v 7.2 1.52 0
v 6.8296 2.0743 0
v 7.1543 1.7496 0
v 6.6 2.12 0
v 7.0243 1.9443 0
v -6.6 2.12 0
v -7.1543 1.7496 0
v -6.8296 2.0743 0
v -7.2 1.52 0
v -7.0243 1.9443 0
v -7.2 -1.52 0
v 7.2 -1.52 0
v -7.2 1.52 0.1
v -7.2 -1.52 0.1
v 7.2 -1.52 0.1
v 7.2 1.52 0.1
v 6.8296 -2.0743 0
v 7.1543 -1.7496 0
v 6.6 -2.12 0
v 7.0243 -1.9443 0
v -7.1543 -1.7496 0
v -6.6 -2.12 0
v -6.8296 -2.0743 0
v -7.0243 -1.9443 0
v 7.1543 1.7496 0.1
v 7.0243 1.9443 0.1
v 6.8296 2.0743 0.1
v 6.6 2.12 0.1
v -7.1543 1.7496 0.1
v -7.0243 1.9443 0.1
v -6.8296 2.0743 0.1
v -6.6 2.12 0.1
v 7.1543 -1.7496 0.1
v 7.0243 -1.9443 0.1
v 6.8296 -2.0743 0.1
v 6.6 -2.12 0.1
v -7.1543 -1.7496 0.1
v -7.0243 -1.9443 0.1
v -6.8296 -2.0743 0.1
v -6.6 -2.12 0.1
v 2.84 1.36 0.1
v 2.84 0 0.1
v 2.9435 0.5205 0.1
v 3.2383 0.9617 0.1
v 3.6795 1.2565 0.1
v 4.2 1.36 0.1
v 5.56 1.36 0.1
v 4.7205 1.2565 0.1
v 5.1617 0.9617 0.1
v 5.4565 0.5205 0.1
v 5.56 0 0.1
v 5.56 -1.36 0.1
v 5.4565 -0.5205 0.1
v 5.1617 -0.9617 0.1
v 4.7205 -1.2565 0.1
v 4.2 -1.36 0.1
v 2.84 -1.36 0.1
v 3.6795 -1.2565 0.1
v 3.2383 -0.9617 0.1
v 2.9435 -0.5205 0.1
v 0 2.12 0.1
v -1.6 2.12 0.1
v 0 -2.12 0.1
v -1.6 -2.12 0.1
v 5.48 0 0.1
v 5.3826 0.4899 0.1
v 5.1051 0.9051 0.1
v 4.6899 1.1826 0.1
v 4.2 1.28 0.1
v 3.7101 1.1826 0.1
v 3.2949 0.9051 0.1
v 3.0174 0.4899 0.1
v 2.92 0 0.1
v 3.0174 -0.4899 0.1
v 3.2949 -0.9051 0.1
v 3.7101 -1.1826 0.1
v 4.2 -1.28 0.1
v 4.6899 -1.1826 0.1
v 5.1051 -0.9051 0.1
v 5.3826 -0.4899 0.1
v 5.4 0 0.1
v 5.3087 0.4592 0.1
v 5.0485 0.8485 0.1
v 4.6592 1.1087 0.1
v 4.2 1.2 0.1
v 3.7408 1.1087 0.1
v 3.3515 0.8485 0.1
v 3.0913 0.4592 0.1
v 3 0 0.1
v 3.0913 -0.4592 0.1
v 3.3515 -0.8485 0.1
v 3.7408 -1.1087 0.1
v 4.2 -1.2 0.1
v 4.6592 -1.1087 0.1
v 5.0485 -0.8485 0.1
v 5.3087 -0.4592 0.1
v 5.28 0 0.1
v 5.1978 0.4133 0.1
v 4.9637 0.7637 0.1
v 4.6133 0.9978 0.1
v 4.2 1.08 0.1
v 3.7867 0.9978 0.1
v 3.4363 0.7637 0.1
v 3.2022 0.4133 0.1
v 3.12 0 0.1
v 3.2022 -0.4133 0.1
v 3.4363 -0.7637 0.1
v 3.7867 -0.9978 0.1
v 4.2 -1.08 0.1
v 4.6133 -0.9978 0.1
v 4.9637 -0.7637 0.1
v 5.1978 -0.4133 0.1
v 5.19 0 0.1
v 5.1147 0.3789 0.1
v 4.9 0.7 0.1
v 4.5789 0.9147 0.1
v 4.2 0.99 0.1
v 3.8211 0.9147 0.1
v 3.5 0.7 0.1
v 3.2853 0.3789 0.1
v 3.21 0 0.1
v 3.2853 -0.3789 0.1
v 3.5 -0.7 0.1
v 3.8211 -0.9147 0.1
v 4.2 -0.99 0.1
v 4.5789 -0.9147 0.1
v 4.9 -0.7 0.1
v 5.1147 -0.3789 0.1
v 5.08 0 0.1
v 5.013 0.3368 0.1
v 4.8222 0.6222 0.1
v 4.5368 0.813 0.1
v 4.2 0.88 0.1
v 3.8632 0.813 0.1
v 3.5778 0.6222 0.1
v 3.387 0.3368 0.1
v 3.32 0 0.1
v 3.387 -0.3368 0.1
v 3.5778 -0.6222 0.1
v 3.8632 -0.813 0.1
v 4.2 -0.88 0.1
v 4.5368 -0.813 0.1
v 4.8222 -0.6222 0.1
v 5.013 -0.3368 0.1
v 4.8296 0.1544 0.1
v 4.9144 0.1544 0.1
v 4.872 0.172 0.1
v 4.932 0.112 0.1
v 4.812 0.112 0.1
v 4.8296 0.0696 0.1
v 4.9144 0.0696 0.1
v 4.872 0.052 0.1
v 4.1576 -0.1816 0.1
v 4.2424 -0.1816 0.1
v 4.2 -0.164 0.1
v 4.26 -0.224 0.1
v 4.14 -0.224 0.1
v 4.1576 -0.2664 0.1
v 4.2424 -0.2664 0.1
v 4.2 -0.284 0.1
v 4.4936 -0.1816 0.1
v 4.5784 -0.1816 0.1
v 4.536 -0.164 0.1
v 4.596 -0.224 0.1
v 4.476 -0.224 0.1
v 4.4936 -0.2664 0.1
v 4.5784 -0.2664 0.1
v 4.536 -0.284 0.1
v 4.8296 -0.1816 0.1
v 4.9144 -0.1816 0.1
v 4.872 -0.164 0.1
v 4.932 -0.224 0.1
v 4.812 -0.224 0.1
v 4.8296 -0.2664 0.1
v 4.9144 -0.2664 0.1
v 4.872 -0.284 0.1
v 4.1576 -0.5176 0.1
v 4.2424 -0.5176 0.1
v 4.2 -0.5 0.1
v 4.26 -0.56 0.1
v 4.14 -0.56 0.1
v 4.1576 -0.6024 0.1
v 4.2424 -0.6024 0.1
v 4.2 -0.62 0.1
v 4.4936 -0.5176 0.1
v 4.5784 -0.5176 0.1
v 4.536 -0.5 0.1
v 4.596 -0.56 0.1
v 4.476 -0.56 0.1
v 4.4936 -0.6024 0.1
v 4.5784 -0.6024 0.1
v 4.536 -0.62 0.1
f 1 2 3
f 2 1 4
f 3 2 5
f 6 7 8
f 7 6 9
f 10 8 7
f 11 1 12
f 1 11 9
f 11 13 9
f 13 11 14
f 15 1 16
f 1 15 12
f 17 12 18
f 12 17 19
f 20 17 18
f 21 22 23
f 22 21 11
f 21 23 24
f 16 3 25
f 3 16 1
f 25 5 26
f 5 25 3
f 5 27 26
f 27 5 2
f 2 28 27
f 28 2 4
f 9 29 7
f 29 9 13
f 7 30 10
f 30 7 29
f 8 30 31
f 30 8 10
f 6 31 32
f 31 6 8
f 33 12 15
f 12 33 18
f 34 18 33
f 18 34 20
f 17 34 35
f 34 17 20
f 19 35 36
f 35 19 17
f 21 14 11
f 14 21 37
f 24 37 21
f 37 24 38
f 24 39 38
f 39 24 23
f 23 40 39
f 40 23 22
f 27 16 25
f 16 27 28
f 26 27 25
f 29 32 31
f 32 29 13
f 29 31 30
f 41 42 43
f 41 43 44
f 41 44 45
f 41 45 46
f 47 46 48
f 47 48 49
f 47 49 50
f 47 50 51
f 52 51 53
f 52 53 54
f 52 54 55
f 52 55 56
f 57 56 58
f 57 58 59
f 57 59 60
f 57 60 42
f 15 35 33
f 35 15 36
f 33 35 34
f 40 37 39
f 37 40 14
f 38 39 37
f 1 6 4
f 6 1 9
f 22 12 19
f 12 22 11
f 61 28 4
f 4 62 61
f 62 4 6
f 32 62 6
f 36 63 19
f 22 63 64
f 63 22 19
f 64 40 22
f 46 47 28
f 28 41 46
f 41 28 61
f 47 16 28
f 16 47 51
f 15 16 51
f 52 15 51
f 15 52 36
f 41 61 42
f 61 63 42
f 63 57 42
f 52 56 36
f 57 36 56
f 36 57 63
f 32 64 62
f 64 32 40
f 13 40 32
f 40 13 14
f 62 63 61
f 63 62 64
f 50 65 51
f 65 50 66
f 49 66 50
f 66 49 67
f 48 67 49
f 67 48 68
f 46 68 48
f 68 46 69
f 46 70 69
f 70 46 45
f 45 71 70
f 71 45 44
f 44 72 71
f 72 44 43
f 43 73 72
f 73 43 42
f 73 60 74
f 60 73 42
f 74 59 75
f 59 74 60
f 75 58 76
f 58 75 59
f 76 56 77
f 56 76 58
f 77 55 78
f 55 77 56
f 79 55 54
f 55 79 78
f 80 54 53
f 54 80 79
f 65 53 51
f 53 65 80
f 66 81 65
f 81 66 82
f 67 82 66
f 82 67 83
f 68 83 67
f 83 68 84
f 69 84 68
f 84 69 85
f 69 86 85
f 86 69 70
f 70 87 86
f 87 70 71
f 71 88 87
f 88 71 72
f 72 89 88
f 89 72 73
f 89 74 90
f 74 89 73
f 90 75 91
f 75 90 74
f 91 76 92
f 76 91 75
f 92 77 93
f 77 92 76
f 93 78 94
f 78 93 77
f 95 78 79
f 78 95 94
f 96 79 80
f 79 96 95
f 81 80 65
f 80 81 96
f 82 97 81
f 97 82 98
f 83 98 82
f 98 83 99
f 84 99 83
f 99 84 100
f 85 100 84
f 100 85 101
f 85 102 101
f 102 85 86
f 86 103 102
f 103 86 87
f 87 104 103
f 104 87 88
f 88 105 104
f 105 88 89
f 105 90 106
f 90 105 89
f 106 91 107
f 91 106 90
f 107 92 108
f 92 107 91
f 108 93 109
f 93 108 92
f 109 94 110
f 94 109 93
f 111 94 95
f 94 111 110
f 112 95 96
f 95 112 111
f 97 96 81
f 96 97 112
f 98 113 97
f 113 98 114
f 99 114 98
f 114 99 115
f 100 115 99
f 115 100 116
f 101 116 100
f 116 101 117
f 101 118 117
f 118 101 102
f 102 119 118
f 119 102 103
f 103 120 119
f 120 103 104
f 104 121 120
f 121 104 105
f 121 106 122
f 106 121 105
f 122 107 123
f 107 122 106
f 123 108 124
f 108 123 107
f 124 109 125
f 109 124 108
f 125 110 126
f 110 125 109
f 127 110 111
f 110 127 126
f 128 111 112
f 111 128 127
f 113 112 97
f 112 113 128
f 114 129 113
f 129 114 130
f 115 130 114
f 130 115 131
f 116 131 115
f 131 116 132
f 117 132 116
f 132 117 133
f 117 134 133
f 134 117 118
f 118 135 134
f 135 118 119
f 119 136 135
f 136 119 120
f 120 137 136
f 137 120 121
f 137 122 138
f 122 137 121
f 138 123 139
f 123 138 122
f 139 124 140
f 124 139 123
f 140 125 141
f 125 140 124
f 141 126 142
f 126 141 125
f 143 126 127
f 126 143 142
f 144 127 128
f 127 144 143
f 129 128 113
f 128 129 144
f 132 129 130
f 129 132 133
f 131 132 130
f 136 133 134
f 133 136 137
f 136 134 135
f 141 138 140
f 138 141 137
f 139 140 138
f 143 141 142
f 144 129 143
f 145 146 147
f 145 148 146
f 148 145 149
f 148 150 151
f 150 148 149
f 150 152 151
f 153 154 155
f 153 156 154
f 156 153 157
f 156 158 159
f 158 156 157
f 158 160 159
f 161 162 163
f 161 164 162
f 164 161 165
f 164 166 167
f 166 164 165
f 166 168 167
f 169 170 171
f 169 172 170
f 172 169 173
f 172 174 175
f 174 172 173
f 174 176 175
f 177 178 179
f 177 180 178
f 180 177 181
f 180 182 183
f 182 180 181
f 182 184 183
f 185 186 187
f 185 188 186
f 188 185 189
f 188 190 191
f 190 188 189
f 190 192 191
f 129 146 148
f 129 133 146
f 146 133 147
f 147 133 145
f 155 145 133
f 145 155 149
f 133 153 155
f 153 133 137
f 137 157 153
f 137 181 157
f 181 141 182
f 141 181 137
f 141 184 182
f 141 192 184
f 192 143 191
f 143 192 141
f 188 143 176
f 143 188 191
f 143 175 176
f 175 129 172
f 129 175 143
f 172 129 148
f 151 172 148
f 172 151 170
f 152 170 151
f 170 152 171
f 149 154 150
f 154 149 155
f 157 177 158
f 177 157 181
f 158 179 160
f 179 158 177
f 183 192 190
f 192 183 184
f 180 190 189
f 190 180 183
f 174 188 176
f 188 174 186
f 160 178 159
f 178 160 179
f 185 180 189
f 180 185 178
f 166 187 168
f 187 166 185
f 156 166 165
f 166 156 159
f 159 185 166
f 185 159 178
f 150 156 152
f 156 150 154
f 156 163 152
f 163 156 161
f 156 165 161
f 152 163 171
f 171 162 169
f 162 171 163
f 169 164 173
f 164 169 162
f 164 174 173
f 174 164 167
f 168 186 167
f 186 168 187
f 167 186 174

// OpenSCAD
// file: ../p/4-4ring9.scad
use <../lib.scad>
function ldraw_lib__4_4ring9() = [
// 0 Ring  9 x 1.0
// 0 Name: 4-4ring9.dat
// 0 Author: John Riley [jriley]
// 0 !LDRAW_ORG Primitive UPDATE 2004-02
// 0 !LICENSE Licensed under CC BY 2.0 and CC BY 4.0 : see CAreadme.txt
// 
// 0 BFC CERTIFY CCW
  [0,"BFC","CERTIFY"],
  [0,"BFC","CCW"],
// 
// 0 !HISTORY 2004-04-22 [PTadmin] Official Update 2004-02
// 0 !HISTORY 2007-06-24 [PTadmin] Header formatted for Contributor Agreement
// 0 !HISTORY 2008-07-01 [PTadmin] Official Update 2008-01
// 
// 
// 4 16 9 0 0 10 0 0 9.239 0 3.827 8.3151 0 3.4443
  [4,16,9,0,0,10,0,0,9.239,0,3.827,8.3151,0,3.4443],
// 4 16 8.3151 0 3.4443 9.239 0 3.827 7.071 0 7.071 6.3639 0 6.3639
  [4,16,8.3151,0,3.4443,9.239,0,3.827,7.071,0,7.071,6.3639,0,6.3639],
// 4 16 6.3639 0 6.3639 7.071 0 7.071 3.827 0 9.239 3.4443 0 8.3151
  [4,16,6.3639,0,6.3639,7.071,0,7.071,3.827,0,9.239,3.4443,0,8.3151],
// 4 16 3.4443 0 8.3151 3.827 0 9.239 0 0 10 0 0 9
  [4,16,3.4443,0,8.3151,3.827,0,9.239,0,0,10,0,0,9],
// 4 16 0 0 9 0 0 10 -3.827 0 9.239 -3.4443 0 8.3151
  [4,16,0,0,9,0,0,10,-3.827,0,9.239,-3.4443,0,8.3151],
// 4 16 -3.4443 0 8.3151 -3.827 0 9.239 -7.071 0 7.071 -6.3639 0 6.3639
  [4,16,-3.4443,0,8.3151,-3.827,0,9.239,-7.071,0,7.071,-6.3639,0,6.3639],
// 4 16 -6.3639 0 6.3639 -7.071 0 7.071 -9.239 0 3.827 -8.3151 0 3.4443
  [4,16,-6.3639,0,6.3639,-7.071,0,7.071,-9.239,0,3.827,-8.3151,0,3.4443],
// 4 16 -8.3151 0 3.4443 -9.239 0 3.827 -10 0 0 -9 0 0
  [4,16,-8.3151,0,3.4443,-9.239,0,3.827,-10,0,0,-9,0,0],
// 4 16 -9 0 0 -10 0 0 -9.239 0 -3.827 -8.3151 0 -3.4443
  [4,16,-9,0,0,-10,0,0,-9.239,0,-3.827,-8.3151,0,-3.4443],
// 4 16 -8.3151 0 -3.4443 -9.239 0 -3.827 -7.071 0 -7.071 -6.3639 0 -6.3639
  [4,16,-8.3151,0,-3.4443,-9.239,0,-3.827,-7.071,0,-7.071,-6.3639,0,-6.3639],
// 4 16 -6.3639 0 -6.3639 -7.071 0 -7.071 -3.827 0 -9.239 -3.4443 0 -8.3151
  [4,16,-6.3639,0,-6.3639,-7.071,0,-7.071,-3.827,0,-9.239,-3.4443,0,-8.3151],
// 4 16 -3.4443 0 -8.3151 -3.827 0 -9.239 0 0 -10 0 0 -9
  [4,16,-3.4443,0,-8.3151,-3.827,0,-9.239,0,0,-10,0,0,-9],
// 4 16 0 0 -9 0 0 -10 3.827 0 -9.239 3.4443 0 -8.3151
  [4,16,0,0,-9,0,0,-10,3.827,0,-9.239,3.4443,0,-8.3151],
// 4 16 3.4443 0 -8.3151 3.827 0 -9.239 7.071 0 -7.071 6.3639 0 -6.3639
  [4,16,3.4443,0,-8.3151,3.827,0,-9.239,7.071,0,-7.071,6.3639,0,-6.3639],
// 4 16 6.3639 0 -6.3639 7.071 0 -7.071 9.239 0 -3.827 8.3151 0 -3.4443
  [4,16,6.3639,0,-6.3639,7.071,0,-7.071,9.239,0,-3.827,8.3151,0,-3.4443],
// 4 16 8.3151 0 -3.4443 9.239 0 -3.827 10 0 0 9 0 0
  [4,16,8.3151,0,-3.4443,9.239,0,-3.827,10,0,0,9,0,0],
// 0
];
module ldraw_lib__4_4ring9(step=0, col=false, unit=2/5, alt=false, line=0.2, solid=!$preview)
    makepoly(ldraw_lib__4_4ring9(), step=step, col=col, unit=unit, alt=alt, line=line, solid=solid);
ldraw_lib__4_4ring9(line=0.2);
// file: ../p/4-4ring8.scad
use <../lib.scad>
function ldraw_lib__4_4ring8() = [
// 0 Ring  8 x 1.0
// 0 Name: 4-4ring8.dat
// 0 Author: Steffen [Steffen]
// 0 !LDRAW_ORG Primitive UPDATE 2012-01
// 0 !LICENSE Licensed under CC BY 4.0 : see CAreadme.txt
// 
// 0 BFC CERTIFY CCW
  [0,"BFC","CERTIFY"],
  [0,"BFC","CCW"],
// 
// 0 !HISTORY 2003-12-19 [PTadmin] Official Update 2003-03
// 0 !HISTORY 2007-06-24 [PTadmin] Header formatted for Contributor Agreement
// 0 !HISTORY 2008-07-01 [PTadmin] Official Update 2008-01
// 0 !HISTORY 2012-02-16 [Philo] Changed to CCW
// 0 !HISTORY 2012-03-30 [PTadmin] Official Update 2012-01
// 
// 
// 4 16 9 0 0 8.3151 0 3.4443 7.3912 0 3.0616 8 0 0
  [4,16,9,0,0,8.3151,0,3.4443,7.3912,0,3.0616,8,0,0],
// 4 16 8.3151 0 3.4443 6.3639 0 6.3639 5.6568 0 5.6568 7.3912 0 3.0616
  [4,16,8.3151,0,3.4443,6.3639,0,6.3639,5.6568,0,5.6568,7.3912,0,3.0616],
// 4 16 6.3639 0 6.3639 3.4443 0 8.3151 3.0616 0 7.3912 5.6568 0 5.6568
  [4,16,6.3639,0,6.3639,3.4443,0,8.3151,3.0616,0,7.3912,5.6568,0,5.6568],
// 4 16 3.4443 0 8.3151 0 0 9 0 0 8 3.0616 0 7.3912
  [4,16,3.4443,0,8.3151,0,0,9,0,0,8,3.0616,0,7.3912],
// 4 16 0 0 9 -3.4443 0 8.3151 -3.0616 0 7.3912 0 0 8
  [4,16,0,0,9,-3.4443,0,8.3151,-3.0616,0,7.3912,0,0,8],
// 4 16 -3.4443 0 8.3151 -6.3639 0 6.3639 -5.6568 0 5.6568 -3.0616 0 7.3912
  [4,16,-3.4443,0,8.3151,-6.3639,0,6.3639,-5.6568,0,5.6568,-3.0616,0,7.3912],
// 4 16 -6.3639 0 6.3639 -8.3151 0 3.4443 -7.3912 0 3.0616 -5.6568 0 5.6568
  [4,16,-6.3639,0,6.3639,-8.3151,0,3.4443,-7.3912,0,3.0616,-5.6568,0,5.6568],
// 4 16 -8.3151 0 3.4443 -9 0 0 -8 0 0 -7.3912 0 3.0616
  [4,16,-8.3151,0,3.4443,-9,0,0,-8,0,0,-7.3912,0,3.0616],
// 4 16 -9 0 0 -8.3151 0 -3.4443 -7.3912 0 -3.0616 -8 0 0
  [4,16,-9,0,0,-8.3151,0,-3.4443,-7.3912,0,-3.0616,-8,0,0],
// 4 16 -8.3151 0 -3.4443 -6.3639 0 -6.3639 -5.6568 0 -5.6568 -7.3912 0 -3.0616
  [4,16,-8.3151,0,-3.4443,-6.3639,0,-6.3639,-5.6568,0,-5.6568,-7.3912,0,-3.0616],
// 4 16 -6.3639 0 -6.3639 -3.4443 0 -8.3151 -3.0616 0 -7.3912 -5.6568 0 -5.6568
  [4,16,-6.3639,0,-6.3639,-3.4443,0,-8.3151,-3.0616,0,-7.3912,-5.6568,0,-5.6568],
// 4 16 -3.4443 0 -8.3151 0 0 -9 0 0 -8 -3.0616 0 -7.3912
  [4,16,-3.4443,0,-8.3151,0,0,-9,0,0,-8,-3.0616,0,-7.3912],
// 4 16 0 0 -9 3.4443 0 -8.3151 3.0616 0 -7.3912 0 0 -8
  [4,16,0,0,-9,3.4443,0,-8.3151,3.0616,0,-7.3912,0,0,-8],
// 4 16 3.4443 0 -8.3151 6.3639 0 -6.3639 5.6568 0 -5.6568 3.0616 0 -7.3912
  [4,16,3.4443,0,-8.3151,6.3639,0,-6.3639,5.6568,0,-5.6568,3.0616,0,-7.3912],
// 4 16 6.3639 0 -6.3639 8.3151 0 -3.4443 7.3912 0 -3.0616 5.6568 0 -5.6568
  [4,16,6.3639,0,-6.3639,8.3151,0,-3.4443,7.3912,0,-3.0616,5.6568,0,-5.6568],
// 4 16 8.3151 0 -3.4443 9 0 0 8 0 0 7.3912 0 -3.0616
  [4,16,8.3151,0,-3.4443,9,0,0,8,0,0,7.3912,0,-3.0616],
];
module ldraw_lib__4_4ring8(step=0, col=false, unit=2/5, alt=false, line=0.2, solid=!$preview)
    makepoly(ldraw_lib__4_4ring8(), step=step, col=col, unit=unit, alt=alt, line=line, solid=solid);
ldraw_lib__4_4ring8(line=0.2);
// file: ../p/4-4rin16.scad
use <../lib.scad>
function ldraw_lib__4_4rin16() = [
// 0 Ring 16 x 1.0
// 0 Name: 4-4rin16.dat
// 0 Author: Guy Vivan [guyvivan]
// 0 !LDRAW_ORG Primitive UPDATE 2009-01
// 0 !LICENSE Licensed under CC BY 2.0 and CC BY 4.0 : see CAreadme.txt
// 
// 0 BFC CERTIFY CCW
  [0,"BFC","CERTIFY"],
  [0,"BFC","CCW"],
// 
// 0 !HISTORY 2009-05-02 [PTadmin] Official Update 2009-01
// 
// 
// 4 16 16 0 0 17 0 0 15.7063 0 6.5059 14.7824 0 6.1232
  [4,16,16,0,0,17,0,0,15.7063,0,6.5059,14.7824,0,6.1232],
// 4 16 14.7824 0 6.1232 15.7063 0 6.5059 12.0207 0 12.0207 11.3136 0 11.3136
  [4,16,14.7824,0,6.1232,15.7063,0,6.5059,12.0207,0,12.0207,11.3136,0,11.3136],
// 4 16 11.3136 0 11.3136 12.0207 0 12.0207 6.5059 0 15.7063 6.1232 0 14.7824
  [4,16,11.3136,0,11.3136,12.0207,0,12.0207,6.5059,0,15.7063,6.1232,0,14.7824],
// 4 16 6.1232 0 14.7824 6.5059 0 15.7063 0 0 17 0 0 16
  [4,16,6.1232,0,14.7824,6.5059,0,15.7063,0,0,17,0,0,16],
// 4 16 0 0 16 0 0 17 -6.5059 0 15.7063 -6.1232 0 14.7824
  [4,16,0,0,16,0,0,17,-6.5059,0,15.7063,-6.1232,0,14.7824],
// 4 16 -6.1232 0 14.7824 -6.5059 0 15.7063 -12.0207 0 12.0207 -11.3136 0 11.3136
  [4,16,-6.1232,0,14.7824,-6.5059,0,15.7063,-12.0207,0,12.0207,-11.3136,0,11.3136],
// 4 16 -11.3136 0 11.3136 -12.0207 0 12.0207 -15.7063 0 6.5059 -14.7824 0 6.1232
  [4,16,-11.3136,0,11.3136,-12.0207,0,12.0207,-15.7063,0,6.5059,-14.7824,0,6.1232],
// 4 16 -14.7824 0 6.1232 -15.7063 0 6.5059 -17 0 0 -16 0 0
  [4,16,-14.7824,0,6.1232,-15.7063,0,6.5059,-17,0,0,-16,0,0],
// 4 16 -16 0 0 -17 0 0 -15.7063 0 -6.5059 -14.7824 0 -6.1232
  [4,16,-16,0,0,-17,0,0,-15.7063,0,-6.5059,-14.7824,0,-6.1232],
// 4 16 -14.7824 0 -6.1232 -15.7063 0 -6.5059 -12.0207 0 -12.0207 -11.3136 0 -11.3136
  [4,16,-14.7824,0,-6.1232,-15.7063,0,-6.5059,-12.0207,0,-12.0207,-11.3136,0,-11.3136],
// 4 16 -11.3136 0 -11.3136 -12.0207 0 -12.0207 -6.5059 0 -15.7063 -6.1232 0 -14.7824
  [4,16,-11.3136,0,-11.3136,-12.0207,0,-12.0207,-6.5059,0,-15.7063,-6.1232,0,-14.7824],
// 4 16 -6.1232 0 -14.7824 -6.5059 0 -15.7063 0 0 -17 0 0 -16
  [4,16,-6.1232,0,-14.7824,-6.5059,0,-15.7063,0,0,-17,0,0,-16],
// 4 16 0 0 -16 0 0 -17 6.5059 0 -15.7063 6.1232 0 -14.7824
  [4,16,0,0,-16,0,0,-17,6.5059,0,-15.7063,6.1232,0,-14.7824],
// 4 16 6.1232 0 -14.7824 6.5059 0 -15.7063 12.0207 0 -12.0207 11.3136 0 -11.3136
  [4,16,6.1232,0,-14.7824,6.5059,0,-15.7063,12.0207,0,-12.0207,11.3136,0,-11.3136],
// 4 16 11.3136 0 -11.3136 12.0207 0 -12.0207 15.7063 0 -6.5059 14.7824 0 -6.1232
  [4,16,11.3136,0,-11.3136,12.0207,0,-12.0207,15.7063,0,-6.5059,14.7824,0,-6.1232],
// 4 16 14.7824 0 -6.1232 15.7063 0 -6.5059 17 0 0 16 0 0
  [4,16,14.7824,0,-6.1232,15.7063,0,-6.5059,17,0,0,16,0,0],
// 
// 0 end of file
// 
];
module ldraw_lib__4_4rin16(step=0, col=false, unit=2/5, alt=false, line=0.2, solid=!$preview)
    makepoly(ldraw_lib__4_4rin16(), step=step, col=col, unit=unit, alt=alt, line=line, solid=solid);
ldraw_lib__4_4rin16(line=0.2);
// file: ../p/4-4rin15.scad
use <../lib.scad>
function ldraw_lib__4_4rin15() = [
// 0 Ring 15 x 1.0
// 0 Name: 4-4rin15.dat
// 0 Author: Mark Kennedy [mkennedy]
// 0 !LDRAW_ORG Primitive UPDATE 2012-01
// 0 !LICENSE Licensed under CC BY 4.0 : see CAreadme.txt
// 
// 0 BFC CERTIFY CCW
  [0,"BFC","CERTIFY"],
  [0,"BFC","CCW"],
// 
// 0 !HISTORY 2004-04-22 [PTadmin] Official Update 2004-02
// 0 !HISTORY 2007-06-24 [PTadmin] Header formatted for Contributor Agreement
// 0 !HISTORY 2008-07-01 [PTadmin] Official Update 2008-01
// 0 !HISTORY 2012-02-16 [Philo] Changed to CCW
// 0 !HISTORY 2012-03-30 [PTadmin] Official Update 2012-01
// 
// 
// 4 16 16 0 0 14.7824 0 6.1232 13.8585 0 5.7405 15 0 0
  [4,16,16,0,0,14.7824,0,6.1232,13.8585,0,5.7405,15,0,0],
// 4 16 14.7824 0 6.1232 11.3136 0 11.3136 10.6065 0 10.6065 13.8585 0 5.7405
  [4,16,14.7824,0,6.1232,11.3136,0,11.3136,10.6065,0,10.6065,13.8585,0,5.7405],
// 4 16 11.3136 0 11.3136 6.1232 0 14.7824 5.7405 0 13.8585 10.6065 0 10.6065
  [4,16,11.3136,0,11.3136,6.1232,0,14.7824,5.7405,0,13.8585,10.6065,0,10.6065],
// 4 16 6.1232 0 14.7824 0 0 16 0 0 15 5.7405 0 13.8585
  [4,16,6.1232,0,14.7824,0,0,16,0,0,15,5.7405,0,13.8585],
// 4 16 0 0 16 -6.1232 0 14.7824 -5.7405 0 13.8585 0 0 15
  [4,16,0,0,16,-6.1232,0,14.7824,-5.7405,0,13.8585,0,0,15],
// 4 16 -6.1232 0 14.7824 -11.3136 0 11.3136 -10.6065 0 10.6065 -5.7405 0 13.8585
  [4,16,-6.1232,0,14.7824,-11.3136,0,11.3136,-10.6065,0,10.6065,-5.7405,0,13.8585],
// 4 16 -11.3136 0 11.3136 -14.7824 0 6.1232 -13.8585 0 5.7405 -10.6065 0 10.6065
  [4,16,-11.3136,0,11.3136,-14.7824,0,6.1232,-13.8585,0,5.7405,-10.6065,0,10.6065],
// 4 16 -14.7824 0 6.1232 -16 0 0 -15 0 0 -13.8585 0 5.7405
  [4,16,-14.7824,0,6.1232,-16,0,0,-15,0,0,-13.8585,0,5.7405],
// 4 16 -16 0 0 -14.7824 0 -6.1232 -13.8585 0 -5.7405 -15 0 0
  [4,16,-16,0,0,-14.7824,0,-6.1232,-13.8585,0,-5.7405,-15,0,0],
// 4 16 -14.7824 0 -6.1232 -11.3136 0 -11.3136 -10.6065 0 -10.6065 -13.8585 0 -5.7405
  [4,16,-14.7824,0,-6.1232,-11.3136,0,-11.3136,-10.6065,0,-10.6065,-13.8585,0,-5.7405],
// 4 16 -11.3136 0 -11.3136 -6.1232 0 -14.7824 -5.7405 0 -13.8585 -10.6065 0 -10.6065
  [4,16,-11.3136,0,-11.3136,-6.1232,0,-14.7824,-5.7405,0,-13.8585,-10.6065,0,-10.6065],
// 4 16 -6.1232 0 -14.7824 0 0 -16 0 0 -15 -5.7405 0 -13.8585
  [4,16,-6.1232,0,-14.7824,0,0,-16,0,0,-15,-5.7405,0,-13.8585],
// 4 16 0 0 -16 6.1232 0 -14.7824 5.7405 0 -13.8585 0 0 -15
  [4,16,0,0,-16,6.1232,0,-14.7824,5.7405,0,-13.8585,0,0,-15],
// 4 16 6.1232 0 -14.7824 11.3136 0 -11.3136 10.6065 0 -10.6065 5.7405 0 -13.8585
  [4,16,6.1232,0,-14.7824,11.3136,0,-11.3136,10.6065,0,-10.6065,5.7405,0,-13.8585],
// 4 16 11.3136 0 -11.3136 14.7824 0 -6.1232 13.8585 0 -5.7405 10.6065 0 -10.6065
  [4,16,11.3136,0,-11.3136,14.7824,0,-6.1232,13.8585,0,-5.7405,10.6065,0,-10.6065],
// 4 16 14.7824 0 -6.1232 16 0 0 15 0 0 13.8585 0 -5.7405
  [4,16,14.7824,0,-6.1232,16,0,0,15,0,0,13.8585,0,-5.7405],
];
module ldraw_lib__4_4rin15(step=0, col=false, unit=2/5, alt=false, line=0.2, solid=!$preview)
    makepoly(ldraw_lib__4_4rin15(), step=step, col=col, unit=unit, alt=alt, line=line, solid=solid);
ldraw_lib__4_4rin15(line=0.2);
// file: ../p/4-4rin11.scad
use <../lib.scad>
function ldraw_lib__4_4rin11() = [
// 0 Ring 11 x 1.0
// 0 Name: 4-4rin11.dat
// 0 Author: John Riley [jriley]
// 0 !LDRAW_ORG Primitive UPDATE 2003-03
// 0 !LICENSE Licensed under CC BY 2.0 and CC BY 4.0 : see CAreadme.txt
// 
// 0 BFC CERTIFY CCW
  [0,"BFC","CERTIFY"],
  [0,"BFC","CCW"],
// 
// 0 !HISTORY 2003-12-19 [PTadmin] Official Update 2003-03
// 0 !HISTORY 2007-06-24 [PTadmin] Header formatted for Contributor Agreement
// 0 !HISTORY 2008-07-01 [PTadmin] Official Update 2008-01
// 
// 
// 4 16 11 0 0 12 0 0 11.0868 0 4.5924 10.1629 0 4.2097
  [4,16,11,0,0,12,0,0,11.0868,0,4.5924,10.1629,0,4.2097],
// 4 16 10.1629 0 4.2097 11.0868 0 4.5924 8.4852 0 8.4852 7.7781 0 7.7781
  [4,16,10.1629,0,4.2097,11.0868,0,4.5924,8.4852,0,8.4852,7.7781,0,7.7781],
// 4 16 7.7781 0 7.7781 8.4852 0 8.4852 4.5924 0 11.0868 4.2097 0 10.1629
  [4,16,7.7781,0,7.7781,8.4852,0,8.4852,4.5924,0,11.0868,4.2097,0,10.1629],
// 4 16 4.2097 0 10.1629 4.5924 0 11.0868 0 0 12 0 0 11
  [4,16,4.2097,0,10.1629,4.5924,0,11.0868,0,0,12,0,0,11],
// 4 16 0 0 11 0 0 12 -4.5924 0 11.0868 -4.2097 0 10.1629
  [4,16,0,0,11,0,0,12,-4.5924,0,11.0868,-4.2097,0,10.1629],
// 4 16 -4.2097 0 10.1629 -4.5924 0 11.0868 -8.4852 0 8.4852 -7.7781 0 7.7781
  [4,16,-4.2097,0,10.1629,-4.5924,0,11.0868,-8.4852,0,8.4852,-7.7781,0,7.7781],
// 4 16 -7.7781 0 7.7781 -8.4852 0 8.4852 -11.0868 0 4.5924 -10.1629 0 4.2097
  [4,16,-7.7781,0,7.7781,-8.4852,0,8.4852,-11.0868,0,4.5924,-10.1629,0,4.2097],
// 4 16 -10.1629 0 4.2097 -11.0868 0 4.5924 -12 0 0 -11 0 0
  [4,16,-10.1629,0,4.2097,-11.0868,0,4.5924,-12,0,0,-11,0,0],
// 4 16 -11 0 0 -12 0 0 -11.0868 0 -4.5924 -10.1629 0 -4.2097
  [4,16,-11,0,0,-12,0,0,-11.0868,0,-4.5924,-10.1629,0,-4.2097],
// 4 16 -10.1629 0 -4.2097 -11.0868 0 -4.5924 -8.4852 0 -8.4852 -7.7781 0 -7.7781
  [4,16,-10.1629,0,-4.2097,-11.0868,0,-4.5924,-8.4852,0,-8.4852,-7.7781,0,-7.7781],
// 4 16 -7.7781 0 -7.7781 -8.4852 0 -8.4852 -4.5924 0 -11.0868 -4.2097 0 -10.1629
  [4,16,-7.7781,0,-7.7781,-8.4852,0,-8.4852,-4.5924,0,-11.0868,-4.2097,0,-10.1629],
// 4 16 -4.2097 0 -10.1629 -4.5924 0 -11.0868 0 0 -12 0 0 -11
  [4,16,-4.2097,0,-10.1629,-4.5924,0,-11.0868,0,0,-12,0,0,-11],
// 4 16 0 0 -11 0 0 -12 4.5924 0 -11.0868 4.2097 0 -10.1629
  [4,16,0,0,-11,0,0,-12,4.5924,0,-11.0868,4.2097,0,-10.1629],
// 4 16 4.2097 0 -10.1629 4.5924 0 -11.0868 8.4852 0 -8.4852 7.7781 0 -7.7781
  [4,16,4.2097,0,-10.1629,4.5924,0,-11.0868,8.4852,0,-8.4852,7.7781,0,-7.7781],
// 4 16 7.7781 0 -7.7781 8.4852 0 -8.4852 11.0868 0 -4.5924 10.1629 0 -4.2097
  [4,16,7.7781,0,-7.7781,8.4852,0,-8.4852,11.0868,0,-4.5924,10.1629,0,-4.2097],
// 4 16 10.1629 0 -4.2097 11.0868 0 -4.5924 12 0 0 11 0 0
  [4,16,10.1629,0,-4.2097,11.0868,0,-4.5924,12,0,0,11,0,0],
// 0
];
module ldraw_lib__4_4rin11(step=0, col=false, unit=2/5, alt=false, line=0.2, solid=!$preview)
    makepoly(ldraw_lib__4_4rin11(), step=step, col=col, unit=unit, alt=alt, line=line, solid=solid);
ldraw_lib__4_4rin11(line=0.2);
// file: ../p/1-8chrd.scad
use <../lib.scad>
function ldraw_lib__1_8chrd() = [
// 0 Chord 0.125
// 0 Name: 1-8chrd.dat
// 0 Author: Andy Westrate [westrate]
// 0 !LDRAW_ORG Primitive UPDATE 2004-02
// 0 !LICENSE Licensed under CC BY 2.0 and CC BY 4.0 : see CAreadme.txt
// 
// 0 BFC CERTIFY CCW
  [0,"BFC","CERTIFY"],
  [0,"BFC","CCW"],
// 
// 0 !HISTORY 2004-04-22 [PTadmin] Official Update 2004-02
// 0 !HISTORY 2007-06-22 [PTadmin] Header formatted for Contributor Agreement
// 0 !HISTORY 2008-07-01 [PTadmin] Official Update 2008-01
// 
// 
// 3 16 0.7071 0 0.7071 1 0 0 0.9239 0 0.3827
  [3,16,0.7071,0,0.7071,1,0,0,0.9239,0,0.3827],
// 
// 0
];
module ldraw_lib__1_8chrd(step=0, col=false, unit=2/5, alt=false, line=0.2, solid=!$preview)
    makepoly(ldraw_lib__1_8chrd(), step=step, col=col, unit=unit, alt=alt, line=line, solid=solid);
ldraw_lib__1_8chrd(line=0.2);
// file: ../p/box3u12.scad
use <../lib.scad>
function ldraw_lib__box3u12() = [
// 0 Box with 3 Parallel Faces without Any Edges
// 0 Name: box3u12.dat
// 0 Author: J.C. Tchang [tchang]
// 0 !LDRAW_ORG Primitive UPDATE 2014-02
// 0 !LICENSE Licensed under CC BY 4.0 : see CAreadme.txt
// 
// 0 BFC CERTIFY CCW
  [0,"BFC","CERTIFY"],
  [0,"BFC","CCW"],
// 
// 0 !HISTORY 2014-12-23 [PTadmin] Official Update 2014-02
// 
// 
// 4 16 -1 1 1 1 1 1 1 1 -1 -1 1 -1
  [4,16,-1,1,1,1,1,1,1,1,-1,-1,1,-1],
// 4 16 -1 1 1 -1 0 1 1 0 1 1 1 1
  [4,16,-1,1,1,-1,0,1,1,0,1,1,1,1],
// 4 16 1 1 -1 1 0 -1 -1 0 -1 -1 1 -1
  [4,16,1,1,-1,1,0,-1,-1,0,-1,-1,1,-1],
];
module ldraw_lib__box3u12(step=0, col=false, unit=2/5, alt=false, line=0.2, solid=!$preview)
    makepoly(ldraw_lib__box3u12(), step=step, col=col, unit=unit, alt=alt, line=line, solid=solid);
ldraw_lib__box3u12(line=0.2);
// file: ../p/4-4ndis.scad
use <../lib.scad>
function ldraw_lib__4_4ndis() = [
// 0 Disc Negative 1.0
// 0 Name: 4-4ndis.dat
// 0 Author: James Jessiman
// 0 !LDRAW_ORG Primitive UPDATE 2012-01
// 0 !LICENSE Licensed under CC BY 4.0 : see CAreadme.txt
// 
// 0 BFC CERTIFY CCW
  [0,"BFC","CERTIFY"],
  [0,"BFC","CCW"],
// 
// 0 !HISTORY 2002-03-23 [sbliss] Added BFC statement; compacted code
// 0 !HISTORY 2002-04-25 [PTadmin] Official Update 2002-02
// 0 !HISTORY 2007-06-24 [PTadmin] Header formatted for Contributor Agreement
// 0 !HISTORY 2008-07-01 [PTadmin] Official Update 2008-01
// 0 !HISTORY 2012-02-16 [Philo] Changed to CCW
// 0 !HISTORY 2012-03-30 [PTadmin] Official Update 2012-01
// 
// 
// 3 16 0.9239 0 0.3827 1 0 0 1 0 1
  [3,16,0.9239,0,0.3827,1,0,0,1,0,1],
// 3 16 0.7071 0 0.7071 0.9239 0 0.3827 1 0 1
  [3,16,0.7071,0,0.7071,0.9239,0,0.3827,1,0,1],
// 3 16 0.3827 0 0.9239 0.7071 0 0.7071 1 0 1
  [3,16,0.3827,0,0.9239,0.7071,0,0.7071,1,0,1],
// 3 16 0 0 1 0.3827 0 0.9239 1 0 1
  [3,16,0,0,1,0.3827,0,0.9239,1,0,1],
// 3 16 -0.3827 0 0.9239 0 0 1 -1 0 1
  [3,16,-0.3827,0,0.9239,0,0,1,-1,0,1],
// 3 16 -0.7071 0 0.7071 -0.3827 0 0.9239 -1 0 1
  [3,16,-0.7071,0,0.7071,-0.3827,0,0.9239,-1,0,1],
// 3 16 -0.9239 0 0.3827 -0.7071 0 0.7071 -1 0 1
  [3,16,-0.9239,0,0.3827,-0.7071,0,0.7071,-1,0,1],
// 3 16 -1 0 0 -0.9239 0 0.3827 -1 0 1
  [3,16,-1,0,0,-0.9239,0,0.3827,-1,0,1],
// 3 16 -0.9239 0 -0.3827 -1 0 0 -1 0 -1
  [3,16,-0.9239,0,-0.3827,-1,0,0,-1,0,-1],
// 3 16 -0.7071 0 -0.7071 -0.9239 0 -0.3827 -1 0 -1
  [3,16,-0.7071,0,-0.7071,-0.9239,0,-0.3827,-1,0,-1],
// 3 16 -0.3827 0 -0.9239 -0.7071 0 -0.7071 -1 0 -1
  [3,16,-0.3827,0,-0.9239,-0.7071,0,-0.7071,-1,0,-1],
// 3 16 0 0 -1 -0.3827 0 -0.9239 -1 0 -1
  [3,16,0,0,-1,-0.3827,0,-0.9239,-1,0,-1],
// 3 16 0.3827 0 -0.9239 0 0 -1 1 0 -1
  [3,16,0.3827,0,-0.9239,0,0,-1,1,0,-1],
// 3 16 0.7071 0 -0.7071 0.3827 0 -0.9239 1 0 -1
  [3,16,0.7071,0,-0.7071,0.3827,0,-0.9239,1,0,-1],
// 3 16 0.9239 0 -0.3827 0.7071 0 -0.7071 1 0 -1
  [3,16,0.9239,0,-0.3827,0.7071,0,-0.7071,1,0,-1],
// 3 16 1 0 0 0.9239 0 -0.3827 1 0 -1
  [3,16,1,0,0,0.9239,0,-0.3827,1,0,-1],
];
module ldraw_lib__4_4ndis(step=0, col=false, unit=2/5, alt=false, line=0.2, solid=!$preview)
    makepoly(ldraw_lib__4_4ndis(), step=step, col=col, unit=unit, alt=alt, line=line, solid=solid);
ldraw_lib__4_4ndis(line=0.2);
// file: ../p/1-4cyli.scad
use <../lib.scad>
function ldraw_lib__1_4cyli() = [
// 0 Cylinder 0.25
// 0 Name: 1-4cyli.dat
// 0 Author: James Jessiman
// 0 !LDRAW_ORG Primitive UPDATE 2012-01
// 0 !LICENSE Licensed under CC BY 4.0 : see CAreadme.txt
// 
// 0 BFC CERTIFY CCW
  [0,"BFC","CERTIFY"],
  [0,"BFC","CCW"],
// 
// 0 !HISTORY 2002-03-23 [sbliss] Added BFC statement.
// 0 !HISTORY 2002-04-25 [PTadmin] Official Update 2002-02
// 0 !HISTORY 2007-06-22 [PTadmin] Header formatted for Contributor Agreement
// 0 !HISTORY 2008-07-01 [PTadmin] Official Update 2008-01
// 0 !HISTORY 2012-02-16 [Philo] Changed to CCW
// 0 !HISTORY 2012-03-30 [PTadmin] Official Update 2012-01
// 
// 
// 4 16 1 1 0 0.9239 1 0.3827 0.9239 0 0.3827 1 0 0
  [4,16,1,1,0,0.9239,1,0.3827,0.9239,0,0.3827,1,0,0],
// 5 24 1 0 0 1 1 0 0.9239 0 0.3827 1 0 -1
  [5,24,1,0,0,1,1,0,0.9239,0,0.3827,1,0,-1],
// 4 16 0.9239 1 0.3827 0.7071 1 0.7071 0.7071 0 0.7071 0.9239 0 0.3827
  [4,16,0.9239,1,0.3827,0.7071,1,0.7071,0.7071,0,0.7071,0.9239,0,0.3827],
// 5 24 0.9239 0 0.3827 0.9239 1 0.3827 0.7071 0 0.7071 1 0 0
  [5,24,0.9239,0,0.3827,0.9239,1,0.3827,0.7071,0,0.7071,1,0,0],
// 4 16 0.7071 1 0.7071 0.3827 1 0.9239 0.3827 0 0.9239 0.7071 0 0.7071
  [4,16,0.7071,1,0.7071,0.3827,1,0.9239,0.3827,0,0.9239,0.7071,0,0.7071],
// 5 24 0.7071 0 0.7071 0.7071 1 0.7071 0.3827 0 0.9239 0.9239 0 0.3827
  [5,24,0.7071,0,0.7071,0.7071,1,0.7071,0.3827,0,0.9239,0.9239,0,0.3827],
// 4 16 0.3827 1 0.9239 0 1 1 0 0 1 0.3827 0 0.9239
  [4,16,0.3827,1,0.9239,0,1,1,0,0,1,0.3827,0,0.9239],
// 5 24 0.3827 0 0.9239 0.3827 1 0.9239 0 0 1 0.7071 0 0.7071
  [5,24,0.3827,0,0.9239,0.3827,1,0.9239,0,0,1,0.7071,0,0.7071],
// 5 24 0 0 1 0 1 1 0.3827 0 0.9239 -1 0 1
  [5,24,0,0,1,0,1,1,0.3827,0,0.9239,-1,0,1],
];
module ldraw_lib__1_4cyli(step=0, col=false, unit=2/5, alt=false, line=0.2, solid=!$preview)
    makepoly(ldraw_lib__1_4cyli(), step=step, col=col, unit=unit, alt=alt, line=line, solid=solid);
ldraw_lib__1_4cyli(line=0.2);
// file: ../p/1-4chrd.scad
use <../lib.scad>
function ldraw_lib__1_4chrd() = [
// 0 Chord 0.25
// 0 Name: 1-4chrd.dat
// 0 Author: Tony Hafner [hafhead]
// 0 !LDRAW_ORG Primitive UPDATE 2012-02
// 0 !LICENSE Licensed under CC BY 2.0 and CC BY 4.0 : see CAreadme.txt
// 
// 0 BFC CERTIFY CCW
  [0,"BFC","CERTIFY"],
  [0,"BFC","CCW"],
// 
// 0 !HISTORY 2004-04-22 [PTadmin] Official Update 2004-02
// 0 !HISTORY 2007-10-09 [PTadmin] Header formatted for Contributor Agreement
// 0 !HISTORY 2008-07-01 [PTadmin] Official Update 2008-01
// 0 !HISTORY 2012-08-02 [MMR1988] Re-creation with PrimGen2 and Rectifier
// 0 !HISTORY 2012-08-09 [PTadmin] Official Update 2012-02
// 
// 
// 4 16 0.9239 0 0.3827 0.3827 0 0.9239 0 0 1 1 0 0
  [4,16,0.9239,0,0.3827,0.3827,0,0.9239,0,0,1,1,0,0],
// 3 16 0.7071 0 0.7071 0.3827 0 0.9239 0.9239 0 0.3827
  [3,16,0.7071,0,0.7071,0.3827,0,0.9239,0.9239,0,0.3827],
];
module ldraw_lib__1_4chrd(step=0, col=false, unit=2/5, alt=false, line=0.2, solid=!$preview)
    makepoly(ldraw_lib__1_4chrd(), step=step, col=col, unit=unit, alt=alt, line=line, solid=solid);
ldraw_lib__1_4chrd(line=0.2);
// file: s/6142617ls01.scad
use <../../lib.scad>
use <../../p/1-4chrd.scad>
use <../../p/1-4cyli.scad>
use <../../p/4-4ndis.scad>
use <../../p/box3u12.scad>
function ldraw_lib__s__6142617ls01() = [
// 0 ~Sticker  0.5 x  1.8 with Fog Light and Silver Stripe on Black Background Left - Common Part
// 0 Name: s\6142617ls01.dat
// 0 Author: Massimo Maso [Sirio]
// 0 !LDRAW_ORG Subpart UPDATE 2023-04
// 0 !LICENSE Licensed under CC BY 4.0 : see CAreadme.txt
// 
// 0 BFC CERTIFY CCW
  [0,"BFC","CERTIFY"],
  [0,"BFC","CCW"],
// 
// 0 !HISTORY 2022-07-18 [PTadmin] Official Update 2022-04
// 0 !HISTORY 2022-07-22 [Sirio] Reduced diameter of fog light; changed color of stripe
// 0 !HISTORY 2023-08-25 [OrionP] Official Update 2023-04
// 
// 
// 0 // Primitives
// 1 16 -16.5 0 3.8 -1.5 0 0 0 -1 0 0 0 1.5 1-4chrd.dat
  [1,16,-16.5,0,3.8,-1.5,0,0,0,-1,0,0,0,1.5, ldraw_lib__1_4chrd()],
// 1 16 16.5 0 3.8 1.5 0 0 0 -1 0 0 0 1.5 1-4chrd.dat
  [1,16,16.5,0,3.8,1.5,0,0,0,-1,0,0,0,1.5, ldraw_lib__1_4chrd()],
// 1 16 0 -.25 0 0 0 18 0 .25 0 3.8 0 0 box3u12.dat
  [1,16,0,-.25,0,0,0,18,0,.25,0,3.8,0,0, ldraw_lib__box3u12()],
// 1 16 -16.5 0 -3.8 -1.5 0 0 0 -1 0 0 0 -1.5 1-4chrd.dat
  [1,16,-16.5,0,-3.8,-1.5,0,0,0,-1,0,0,0,-1.5, ldraw_lib__1_4chrd()],
// 1 16 16.5 0 -3.8 1.5 0 0 0 -1 0 0 0 -1.5 1-4chrd.dat
  [1,16,16.5,0,-3.8,1.5,0,0,0,-1,0,0,0,-1.5, ldraw_lib__1_4chrd()],
// 1 16 -16.5 0 3.8 -1.5 0 0 0 -.25 0 0 0 1.5 1-4cyli.dat
  [1,16,-16.5,0,3.8,-1.5,0,0,0,-.25,0,0,0,1.5, ldraw_lib__1_4cyli()],
// 1 16 16.5 0 3.8 1.5 0 0 0 -.25 0 0 0 1.5 1-4cyli.dat
  [1,16,16.5,0,3.8,1.5,0,0,0,-.25,0,0,0,1.5, ldraw_lib__1_4cyli()],
// 1 16 -16.5 0 -3.8 -1.5 0 0 0 -.25 0 0 0 -1.5 1-4cyli.dat
  [1,16,-16.5,0,-3.8,-1.5,0,0,0,-.25,0,0,0,-1.5, ldraw_lib__1_4cyli()],
// 1 16 16.5 0 -3.8 1.5 0 0 0 -.25 0 0 0 -1.5 1-4cyli.dat
  [1,16,16.5,0,-3.8,1.5,0,0,0,-.25,0,0,0,-1.5, ldraw_lib__1_4cyli()],
// 1 0 -16.5 -.25 3.8 -1.5 0 0 0 1 0 0 0 1.5 1-4chrd.dat
  [1,0,-16.5,-.25,3.8,-1.5,0,0,0,1,0,0,0,1.5, ldraw_lib__1_4chrd()],
// 1 0 16.5 -.25 3.8 1.5 0 0 0 1 0 0 0 1.5 1-4chrd.dat
  [1,0,16.5,-.25,3.8,1.5,0,0,0,1,0,0,0,1.5, ldraw_lib__1_4chrd()],
// 1 0 -10.5 -.25 0 3.4 0 0 0 1 0 0 0 3.4 4-4ndis.dat
  [1,0,-10.5,-.25,0,3.4,0,0,0,1,0,0,0,3.4, ldraw_lib__4_4ndis()],
// 1 0 -16.5 -.25 -3.8 -1.5 0 0 0 1 0 0 0 -1.5 1-4chrd.dat
  [1,0,-16.5,-.25,-3.8,-1.5,0,0,0,1,0,0,0,-1.5, ldraw_lib__1_4chrd()],
// 1 0 16.5 -.25 -3.8 1.5 0 0 0 1 0 0 0 -1.5 1-4chrd.dat
  [1,0,16.5,-.25,-3.8,1.5,0,0,0,1,0,0,0,-1.5, ldraw_lib__1_4chrd()],
// 0 // Bottom face
// 4 16 16.5 0 5.3 18 0 3.8 -18 0 3.8 -16.5 0 5.3
  [4,16,16.5,0,5.3,18,0,3.8,-18,0,3.8,-16.5,0,5.3],
// 4 16 16.5 0 -5.3 -16.5 0 -5.3 -18 0 -3.8 18 0 -3.8
  [4,16,16.5,0,-5.3,-16.5,0,-5.3,-18,0,-3.8,18,0,-3.8],
// 0 // Lateral face
// 3 16 -16.5 0 5.3 -16.5 -.25 5.3 0 -.25 5.3
  [3,16,-16.5,0,5.3,-16.5,-.25,5.3,0,-.25,5.3],
// 4 16 -16.5 0 5.3 0 -.25 5.3 4 -.25 5.3 16.5 0 5.3
  [4,16,-16.5,0,5.3,0,-.25,5.3,4,-.25,5.3,16.5,0,5.3],
// 3 16 16.5 0 5.3 4 -.25 5.3 16.5 -.25 5.3
  [3,16,16.5,0,5.3,4,-.25,5.3,16.5,-.25,5.3],
// 3 16 -16.5 0 -5.3 0 -.25 -5.3 -16.5 -.25 -5.3
  [3,16,-16.5,0,-5.3,0,-.25,-5.3,-16.5,-.25,-5.3],
// 4 16 -16.5 0 -5.3 16.5 0 -5.3 4 -.25 -5.3 0 -.25 -5.3
  [4,16,-16.5,0,-5.3,16.5,0,-5.3,4,-.25,-5.3,0,-.25,-5.3],
// 3 16 16.5 0 -5.3 16.5 -.25 -5.3 4 -.25 -5.3
  [3,16,16.5,0,-5.3,16.5,-.25,-5.3,4,-.25,-5.3],
// 0 // Top face
// 0 // Black faces
// 3 0 -16.5 -.25 5.3 -13.9 -.25 3.4 -10.5 -.25 3.4
  [3,0,-16.5,-.25,5.3,-13.9,-.25,3.4,-10.5,-.25,3.4],
// 4 0 -16.5 -.25 5.3 -10.5 -.25 3.4 -7.1 -.25 3.4 0 -.25 5.3
  [4,0,-16.5,-.25,5.3,-10.5,-.25,3.4,-7.1,-.25,3.4,0,-.25,5.3],
// 4 0 -13.9 -.25 0 -13.9 -.25 3.4 -16.5 -.25 5.3 -18 -.25 3.8
  [4,0,-13.9,-.25,0,-13.9,-.25,3.4,-16.5,-.25,5.3,-18,-.25,3.8],
// 3 0 -13.9 -.25 0 -18 -.25 3.8 -18 -.25 -3.8
  [3,0,-13.9,-.25,0,-18,-.25,3.8,-18,-.25,-3.8],
// 4 0 -13.9 -.25 0 -18 -.25 -3.8 -16.5 -.25 -5.3 -13.9 -.25 -3.4
  [4,0,-13.9,-.25,0,-18,-.25,-3.8,-16.5,-.25,-5.3,-13.9,-.25,-3.4],
// 3 0 -7.1 -.25 0 0 -.25 5.3 -7.1 -.25 3.4
  [3,0,-7.1,-.25,0,0,-.25,5.3,-7.1,-.25,3.4],
// 3 0 -7.1 -.25 0 0 -.25 -5.3 0 -.25 5.3
  [3,0,-7.1,-.25,0,0,-.25,-5.3,0,-.25,5.3],
// 3 0 -7.1 -.25 0 -7.1 -.25 -3.4 0 -.25 -5.3
  [3,0,-7.1,-.25,0,-7.1,-.25,-3.4,0,-.25,-5.3],
// 3 0 -16.5 -.25 -5.3 -10.5 -.25 -3.4 -13.9 -.25 -3.4
  [3,0,-16.5,-.25,-5.3,-10.5,-.25,-3.4,-13.9,-.25,-3.4],
// 4 0 -16.5 -.25 -5.3 0 -.25 -5.3 -7.1 -.25 -3.4 -10.5 -.25 -3.4
  [4,0,-16.5,-.25,-5.3,0,-.25,-5.3,-7.1,-.25,-3.4,-10.5,-.25,-3.4],
// 4 0 16.5 -.25 5.3 4 -.25 5.3 4 -.25 -5.3 16.5 -.25 -5.3
  [4,0,16.5,-.25,5.3,4,-.25,5.3,4,-.25,-5.3,16.5,-.25,-5.3],
// 4 0 16.5 -.25 5.3 16.5 -.25 -5.3 18 -.25 -3.8 18 -.25 3.8
  [4,0,16.5,-.25,5.3,16.5,-.25,-5.3,18,-.25,-3.8,18,-.25,3.8],
// 0 // Silver face
// 4 80 0 -.25 5.3 0 -.25 -5.3 4 -.25 -5.3 4 -.25 5.3
  [4,80,0,-.25,5.3,0,-.25,-5.3,4,-.25,-5.3,4,-.25,5.3],
];
module ldraw_lib__s__6142617ls01(step=0, col=false, unit=2/5, alt=false, line=0.2, solid=!$preview)
    makepoly(ldraw_lib__s__6142617ls01(), step=step, col=col, unit=unit, alt=alt, line=line, solid=solid);
ldraw_lib__s__6142617ls01(line=0.2);
// main file
use <../lib.scad>
use <s/6142617ls01.scad>
use <s/6142617ls02.scad>
function ldraw_lib__6142617m() = [
// 0 Sticker  0.5 x  1.8 with Fog Light and Silver Stripe on Black Background Right
// 0 Name: 6142617m.dat
// 0 Author: Massimo Maso [Sirio]
// 0 !LDRAW_ORG Part UPDATE 2023-04
// 0 !LICENSE Licensed under CC BY 4.0 : see CAreadme.txt
// 
// 0 BFC CERTIFY CCW
  [0,"BFC","CERTIFY"],
  [0,"BFC","CCW"],
// 
// 0 !KEYWORDS 1969, Camaro, Chevrolet, Drag, Race, Set 75874, Speed Champions
// 0 !KEYWORDS Z/28
// 
// 0 !HISTORY 2023-08-25 [OrionP] Official Update 2023-04
// 
// 
// 0 // Subparts
// 
// 1 16 0 0 0 -1 0 0 0 1 0 0 0 1 s\6142617ls01.dat
  [1,16,0,0,0,-1,0,0,0,1,0,0,0,1, ldraw_lib__s__6142617ls01()],
// 1 16 10.5 -.25 0 1 0 0 0 1 0 0 0 1 s\6142617ls02.dat
  [1,16,10.5,-.25,0,1,0,0,0,1,0,0,0,1, ldraw_lib__s__6142617ls02()],
];
module ldraw_lib__6142617m(step=0, col=false, unit=2/5, alt=false, line=0.2, solid=!$preview)
    makepoly(ldraw_lib__6142617m(), step=step, col=col, unit=unit, alt=alt, line=line, solid=solid);
ldraw_lib__6142617m(line=0.2);
